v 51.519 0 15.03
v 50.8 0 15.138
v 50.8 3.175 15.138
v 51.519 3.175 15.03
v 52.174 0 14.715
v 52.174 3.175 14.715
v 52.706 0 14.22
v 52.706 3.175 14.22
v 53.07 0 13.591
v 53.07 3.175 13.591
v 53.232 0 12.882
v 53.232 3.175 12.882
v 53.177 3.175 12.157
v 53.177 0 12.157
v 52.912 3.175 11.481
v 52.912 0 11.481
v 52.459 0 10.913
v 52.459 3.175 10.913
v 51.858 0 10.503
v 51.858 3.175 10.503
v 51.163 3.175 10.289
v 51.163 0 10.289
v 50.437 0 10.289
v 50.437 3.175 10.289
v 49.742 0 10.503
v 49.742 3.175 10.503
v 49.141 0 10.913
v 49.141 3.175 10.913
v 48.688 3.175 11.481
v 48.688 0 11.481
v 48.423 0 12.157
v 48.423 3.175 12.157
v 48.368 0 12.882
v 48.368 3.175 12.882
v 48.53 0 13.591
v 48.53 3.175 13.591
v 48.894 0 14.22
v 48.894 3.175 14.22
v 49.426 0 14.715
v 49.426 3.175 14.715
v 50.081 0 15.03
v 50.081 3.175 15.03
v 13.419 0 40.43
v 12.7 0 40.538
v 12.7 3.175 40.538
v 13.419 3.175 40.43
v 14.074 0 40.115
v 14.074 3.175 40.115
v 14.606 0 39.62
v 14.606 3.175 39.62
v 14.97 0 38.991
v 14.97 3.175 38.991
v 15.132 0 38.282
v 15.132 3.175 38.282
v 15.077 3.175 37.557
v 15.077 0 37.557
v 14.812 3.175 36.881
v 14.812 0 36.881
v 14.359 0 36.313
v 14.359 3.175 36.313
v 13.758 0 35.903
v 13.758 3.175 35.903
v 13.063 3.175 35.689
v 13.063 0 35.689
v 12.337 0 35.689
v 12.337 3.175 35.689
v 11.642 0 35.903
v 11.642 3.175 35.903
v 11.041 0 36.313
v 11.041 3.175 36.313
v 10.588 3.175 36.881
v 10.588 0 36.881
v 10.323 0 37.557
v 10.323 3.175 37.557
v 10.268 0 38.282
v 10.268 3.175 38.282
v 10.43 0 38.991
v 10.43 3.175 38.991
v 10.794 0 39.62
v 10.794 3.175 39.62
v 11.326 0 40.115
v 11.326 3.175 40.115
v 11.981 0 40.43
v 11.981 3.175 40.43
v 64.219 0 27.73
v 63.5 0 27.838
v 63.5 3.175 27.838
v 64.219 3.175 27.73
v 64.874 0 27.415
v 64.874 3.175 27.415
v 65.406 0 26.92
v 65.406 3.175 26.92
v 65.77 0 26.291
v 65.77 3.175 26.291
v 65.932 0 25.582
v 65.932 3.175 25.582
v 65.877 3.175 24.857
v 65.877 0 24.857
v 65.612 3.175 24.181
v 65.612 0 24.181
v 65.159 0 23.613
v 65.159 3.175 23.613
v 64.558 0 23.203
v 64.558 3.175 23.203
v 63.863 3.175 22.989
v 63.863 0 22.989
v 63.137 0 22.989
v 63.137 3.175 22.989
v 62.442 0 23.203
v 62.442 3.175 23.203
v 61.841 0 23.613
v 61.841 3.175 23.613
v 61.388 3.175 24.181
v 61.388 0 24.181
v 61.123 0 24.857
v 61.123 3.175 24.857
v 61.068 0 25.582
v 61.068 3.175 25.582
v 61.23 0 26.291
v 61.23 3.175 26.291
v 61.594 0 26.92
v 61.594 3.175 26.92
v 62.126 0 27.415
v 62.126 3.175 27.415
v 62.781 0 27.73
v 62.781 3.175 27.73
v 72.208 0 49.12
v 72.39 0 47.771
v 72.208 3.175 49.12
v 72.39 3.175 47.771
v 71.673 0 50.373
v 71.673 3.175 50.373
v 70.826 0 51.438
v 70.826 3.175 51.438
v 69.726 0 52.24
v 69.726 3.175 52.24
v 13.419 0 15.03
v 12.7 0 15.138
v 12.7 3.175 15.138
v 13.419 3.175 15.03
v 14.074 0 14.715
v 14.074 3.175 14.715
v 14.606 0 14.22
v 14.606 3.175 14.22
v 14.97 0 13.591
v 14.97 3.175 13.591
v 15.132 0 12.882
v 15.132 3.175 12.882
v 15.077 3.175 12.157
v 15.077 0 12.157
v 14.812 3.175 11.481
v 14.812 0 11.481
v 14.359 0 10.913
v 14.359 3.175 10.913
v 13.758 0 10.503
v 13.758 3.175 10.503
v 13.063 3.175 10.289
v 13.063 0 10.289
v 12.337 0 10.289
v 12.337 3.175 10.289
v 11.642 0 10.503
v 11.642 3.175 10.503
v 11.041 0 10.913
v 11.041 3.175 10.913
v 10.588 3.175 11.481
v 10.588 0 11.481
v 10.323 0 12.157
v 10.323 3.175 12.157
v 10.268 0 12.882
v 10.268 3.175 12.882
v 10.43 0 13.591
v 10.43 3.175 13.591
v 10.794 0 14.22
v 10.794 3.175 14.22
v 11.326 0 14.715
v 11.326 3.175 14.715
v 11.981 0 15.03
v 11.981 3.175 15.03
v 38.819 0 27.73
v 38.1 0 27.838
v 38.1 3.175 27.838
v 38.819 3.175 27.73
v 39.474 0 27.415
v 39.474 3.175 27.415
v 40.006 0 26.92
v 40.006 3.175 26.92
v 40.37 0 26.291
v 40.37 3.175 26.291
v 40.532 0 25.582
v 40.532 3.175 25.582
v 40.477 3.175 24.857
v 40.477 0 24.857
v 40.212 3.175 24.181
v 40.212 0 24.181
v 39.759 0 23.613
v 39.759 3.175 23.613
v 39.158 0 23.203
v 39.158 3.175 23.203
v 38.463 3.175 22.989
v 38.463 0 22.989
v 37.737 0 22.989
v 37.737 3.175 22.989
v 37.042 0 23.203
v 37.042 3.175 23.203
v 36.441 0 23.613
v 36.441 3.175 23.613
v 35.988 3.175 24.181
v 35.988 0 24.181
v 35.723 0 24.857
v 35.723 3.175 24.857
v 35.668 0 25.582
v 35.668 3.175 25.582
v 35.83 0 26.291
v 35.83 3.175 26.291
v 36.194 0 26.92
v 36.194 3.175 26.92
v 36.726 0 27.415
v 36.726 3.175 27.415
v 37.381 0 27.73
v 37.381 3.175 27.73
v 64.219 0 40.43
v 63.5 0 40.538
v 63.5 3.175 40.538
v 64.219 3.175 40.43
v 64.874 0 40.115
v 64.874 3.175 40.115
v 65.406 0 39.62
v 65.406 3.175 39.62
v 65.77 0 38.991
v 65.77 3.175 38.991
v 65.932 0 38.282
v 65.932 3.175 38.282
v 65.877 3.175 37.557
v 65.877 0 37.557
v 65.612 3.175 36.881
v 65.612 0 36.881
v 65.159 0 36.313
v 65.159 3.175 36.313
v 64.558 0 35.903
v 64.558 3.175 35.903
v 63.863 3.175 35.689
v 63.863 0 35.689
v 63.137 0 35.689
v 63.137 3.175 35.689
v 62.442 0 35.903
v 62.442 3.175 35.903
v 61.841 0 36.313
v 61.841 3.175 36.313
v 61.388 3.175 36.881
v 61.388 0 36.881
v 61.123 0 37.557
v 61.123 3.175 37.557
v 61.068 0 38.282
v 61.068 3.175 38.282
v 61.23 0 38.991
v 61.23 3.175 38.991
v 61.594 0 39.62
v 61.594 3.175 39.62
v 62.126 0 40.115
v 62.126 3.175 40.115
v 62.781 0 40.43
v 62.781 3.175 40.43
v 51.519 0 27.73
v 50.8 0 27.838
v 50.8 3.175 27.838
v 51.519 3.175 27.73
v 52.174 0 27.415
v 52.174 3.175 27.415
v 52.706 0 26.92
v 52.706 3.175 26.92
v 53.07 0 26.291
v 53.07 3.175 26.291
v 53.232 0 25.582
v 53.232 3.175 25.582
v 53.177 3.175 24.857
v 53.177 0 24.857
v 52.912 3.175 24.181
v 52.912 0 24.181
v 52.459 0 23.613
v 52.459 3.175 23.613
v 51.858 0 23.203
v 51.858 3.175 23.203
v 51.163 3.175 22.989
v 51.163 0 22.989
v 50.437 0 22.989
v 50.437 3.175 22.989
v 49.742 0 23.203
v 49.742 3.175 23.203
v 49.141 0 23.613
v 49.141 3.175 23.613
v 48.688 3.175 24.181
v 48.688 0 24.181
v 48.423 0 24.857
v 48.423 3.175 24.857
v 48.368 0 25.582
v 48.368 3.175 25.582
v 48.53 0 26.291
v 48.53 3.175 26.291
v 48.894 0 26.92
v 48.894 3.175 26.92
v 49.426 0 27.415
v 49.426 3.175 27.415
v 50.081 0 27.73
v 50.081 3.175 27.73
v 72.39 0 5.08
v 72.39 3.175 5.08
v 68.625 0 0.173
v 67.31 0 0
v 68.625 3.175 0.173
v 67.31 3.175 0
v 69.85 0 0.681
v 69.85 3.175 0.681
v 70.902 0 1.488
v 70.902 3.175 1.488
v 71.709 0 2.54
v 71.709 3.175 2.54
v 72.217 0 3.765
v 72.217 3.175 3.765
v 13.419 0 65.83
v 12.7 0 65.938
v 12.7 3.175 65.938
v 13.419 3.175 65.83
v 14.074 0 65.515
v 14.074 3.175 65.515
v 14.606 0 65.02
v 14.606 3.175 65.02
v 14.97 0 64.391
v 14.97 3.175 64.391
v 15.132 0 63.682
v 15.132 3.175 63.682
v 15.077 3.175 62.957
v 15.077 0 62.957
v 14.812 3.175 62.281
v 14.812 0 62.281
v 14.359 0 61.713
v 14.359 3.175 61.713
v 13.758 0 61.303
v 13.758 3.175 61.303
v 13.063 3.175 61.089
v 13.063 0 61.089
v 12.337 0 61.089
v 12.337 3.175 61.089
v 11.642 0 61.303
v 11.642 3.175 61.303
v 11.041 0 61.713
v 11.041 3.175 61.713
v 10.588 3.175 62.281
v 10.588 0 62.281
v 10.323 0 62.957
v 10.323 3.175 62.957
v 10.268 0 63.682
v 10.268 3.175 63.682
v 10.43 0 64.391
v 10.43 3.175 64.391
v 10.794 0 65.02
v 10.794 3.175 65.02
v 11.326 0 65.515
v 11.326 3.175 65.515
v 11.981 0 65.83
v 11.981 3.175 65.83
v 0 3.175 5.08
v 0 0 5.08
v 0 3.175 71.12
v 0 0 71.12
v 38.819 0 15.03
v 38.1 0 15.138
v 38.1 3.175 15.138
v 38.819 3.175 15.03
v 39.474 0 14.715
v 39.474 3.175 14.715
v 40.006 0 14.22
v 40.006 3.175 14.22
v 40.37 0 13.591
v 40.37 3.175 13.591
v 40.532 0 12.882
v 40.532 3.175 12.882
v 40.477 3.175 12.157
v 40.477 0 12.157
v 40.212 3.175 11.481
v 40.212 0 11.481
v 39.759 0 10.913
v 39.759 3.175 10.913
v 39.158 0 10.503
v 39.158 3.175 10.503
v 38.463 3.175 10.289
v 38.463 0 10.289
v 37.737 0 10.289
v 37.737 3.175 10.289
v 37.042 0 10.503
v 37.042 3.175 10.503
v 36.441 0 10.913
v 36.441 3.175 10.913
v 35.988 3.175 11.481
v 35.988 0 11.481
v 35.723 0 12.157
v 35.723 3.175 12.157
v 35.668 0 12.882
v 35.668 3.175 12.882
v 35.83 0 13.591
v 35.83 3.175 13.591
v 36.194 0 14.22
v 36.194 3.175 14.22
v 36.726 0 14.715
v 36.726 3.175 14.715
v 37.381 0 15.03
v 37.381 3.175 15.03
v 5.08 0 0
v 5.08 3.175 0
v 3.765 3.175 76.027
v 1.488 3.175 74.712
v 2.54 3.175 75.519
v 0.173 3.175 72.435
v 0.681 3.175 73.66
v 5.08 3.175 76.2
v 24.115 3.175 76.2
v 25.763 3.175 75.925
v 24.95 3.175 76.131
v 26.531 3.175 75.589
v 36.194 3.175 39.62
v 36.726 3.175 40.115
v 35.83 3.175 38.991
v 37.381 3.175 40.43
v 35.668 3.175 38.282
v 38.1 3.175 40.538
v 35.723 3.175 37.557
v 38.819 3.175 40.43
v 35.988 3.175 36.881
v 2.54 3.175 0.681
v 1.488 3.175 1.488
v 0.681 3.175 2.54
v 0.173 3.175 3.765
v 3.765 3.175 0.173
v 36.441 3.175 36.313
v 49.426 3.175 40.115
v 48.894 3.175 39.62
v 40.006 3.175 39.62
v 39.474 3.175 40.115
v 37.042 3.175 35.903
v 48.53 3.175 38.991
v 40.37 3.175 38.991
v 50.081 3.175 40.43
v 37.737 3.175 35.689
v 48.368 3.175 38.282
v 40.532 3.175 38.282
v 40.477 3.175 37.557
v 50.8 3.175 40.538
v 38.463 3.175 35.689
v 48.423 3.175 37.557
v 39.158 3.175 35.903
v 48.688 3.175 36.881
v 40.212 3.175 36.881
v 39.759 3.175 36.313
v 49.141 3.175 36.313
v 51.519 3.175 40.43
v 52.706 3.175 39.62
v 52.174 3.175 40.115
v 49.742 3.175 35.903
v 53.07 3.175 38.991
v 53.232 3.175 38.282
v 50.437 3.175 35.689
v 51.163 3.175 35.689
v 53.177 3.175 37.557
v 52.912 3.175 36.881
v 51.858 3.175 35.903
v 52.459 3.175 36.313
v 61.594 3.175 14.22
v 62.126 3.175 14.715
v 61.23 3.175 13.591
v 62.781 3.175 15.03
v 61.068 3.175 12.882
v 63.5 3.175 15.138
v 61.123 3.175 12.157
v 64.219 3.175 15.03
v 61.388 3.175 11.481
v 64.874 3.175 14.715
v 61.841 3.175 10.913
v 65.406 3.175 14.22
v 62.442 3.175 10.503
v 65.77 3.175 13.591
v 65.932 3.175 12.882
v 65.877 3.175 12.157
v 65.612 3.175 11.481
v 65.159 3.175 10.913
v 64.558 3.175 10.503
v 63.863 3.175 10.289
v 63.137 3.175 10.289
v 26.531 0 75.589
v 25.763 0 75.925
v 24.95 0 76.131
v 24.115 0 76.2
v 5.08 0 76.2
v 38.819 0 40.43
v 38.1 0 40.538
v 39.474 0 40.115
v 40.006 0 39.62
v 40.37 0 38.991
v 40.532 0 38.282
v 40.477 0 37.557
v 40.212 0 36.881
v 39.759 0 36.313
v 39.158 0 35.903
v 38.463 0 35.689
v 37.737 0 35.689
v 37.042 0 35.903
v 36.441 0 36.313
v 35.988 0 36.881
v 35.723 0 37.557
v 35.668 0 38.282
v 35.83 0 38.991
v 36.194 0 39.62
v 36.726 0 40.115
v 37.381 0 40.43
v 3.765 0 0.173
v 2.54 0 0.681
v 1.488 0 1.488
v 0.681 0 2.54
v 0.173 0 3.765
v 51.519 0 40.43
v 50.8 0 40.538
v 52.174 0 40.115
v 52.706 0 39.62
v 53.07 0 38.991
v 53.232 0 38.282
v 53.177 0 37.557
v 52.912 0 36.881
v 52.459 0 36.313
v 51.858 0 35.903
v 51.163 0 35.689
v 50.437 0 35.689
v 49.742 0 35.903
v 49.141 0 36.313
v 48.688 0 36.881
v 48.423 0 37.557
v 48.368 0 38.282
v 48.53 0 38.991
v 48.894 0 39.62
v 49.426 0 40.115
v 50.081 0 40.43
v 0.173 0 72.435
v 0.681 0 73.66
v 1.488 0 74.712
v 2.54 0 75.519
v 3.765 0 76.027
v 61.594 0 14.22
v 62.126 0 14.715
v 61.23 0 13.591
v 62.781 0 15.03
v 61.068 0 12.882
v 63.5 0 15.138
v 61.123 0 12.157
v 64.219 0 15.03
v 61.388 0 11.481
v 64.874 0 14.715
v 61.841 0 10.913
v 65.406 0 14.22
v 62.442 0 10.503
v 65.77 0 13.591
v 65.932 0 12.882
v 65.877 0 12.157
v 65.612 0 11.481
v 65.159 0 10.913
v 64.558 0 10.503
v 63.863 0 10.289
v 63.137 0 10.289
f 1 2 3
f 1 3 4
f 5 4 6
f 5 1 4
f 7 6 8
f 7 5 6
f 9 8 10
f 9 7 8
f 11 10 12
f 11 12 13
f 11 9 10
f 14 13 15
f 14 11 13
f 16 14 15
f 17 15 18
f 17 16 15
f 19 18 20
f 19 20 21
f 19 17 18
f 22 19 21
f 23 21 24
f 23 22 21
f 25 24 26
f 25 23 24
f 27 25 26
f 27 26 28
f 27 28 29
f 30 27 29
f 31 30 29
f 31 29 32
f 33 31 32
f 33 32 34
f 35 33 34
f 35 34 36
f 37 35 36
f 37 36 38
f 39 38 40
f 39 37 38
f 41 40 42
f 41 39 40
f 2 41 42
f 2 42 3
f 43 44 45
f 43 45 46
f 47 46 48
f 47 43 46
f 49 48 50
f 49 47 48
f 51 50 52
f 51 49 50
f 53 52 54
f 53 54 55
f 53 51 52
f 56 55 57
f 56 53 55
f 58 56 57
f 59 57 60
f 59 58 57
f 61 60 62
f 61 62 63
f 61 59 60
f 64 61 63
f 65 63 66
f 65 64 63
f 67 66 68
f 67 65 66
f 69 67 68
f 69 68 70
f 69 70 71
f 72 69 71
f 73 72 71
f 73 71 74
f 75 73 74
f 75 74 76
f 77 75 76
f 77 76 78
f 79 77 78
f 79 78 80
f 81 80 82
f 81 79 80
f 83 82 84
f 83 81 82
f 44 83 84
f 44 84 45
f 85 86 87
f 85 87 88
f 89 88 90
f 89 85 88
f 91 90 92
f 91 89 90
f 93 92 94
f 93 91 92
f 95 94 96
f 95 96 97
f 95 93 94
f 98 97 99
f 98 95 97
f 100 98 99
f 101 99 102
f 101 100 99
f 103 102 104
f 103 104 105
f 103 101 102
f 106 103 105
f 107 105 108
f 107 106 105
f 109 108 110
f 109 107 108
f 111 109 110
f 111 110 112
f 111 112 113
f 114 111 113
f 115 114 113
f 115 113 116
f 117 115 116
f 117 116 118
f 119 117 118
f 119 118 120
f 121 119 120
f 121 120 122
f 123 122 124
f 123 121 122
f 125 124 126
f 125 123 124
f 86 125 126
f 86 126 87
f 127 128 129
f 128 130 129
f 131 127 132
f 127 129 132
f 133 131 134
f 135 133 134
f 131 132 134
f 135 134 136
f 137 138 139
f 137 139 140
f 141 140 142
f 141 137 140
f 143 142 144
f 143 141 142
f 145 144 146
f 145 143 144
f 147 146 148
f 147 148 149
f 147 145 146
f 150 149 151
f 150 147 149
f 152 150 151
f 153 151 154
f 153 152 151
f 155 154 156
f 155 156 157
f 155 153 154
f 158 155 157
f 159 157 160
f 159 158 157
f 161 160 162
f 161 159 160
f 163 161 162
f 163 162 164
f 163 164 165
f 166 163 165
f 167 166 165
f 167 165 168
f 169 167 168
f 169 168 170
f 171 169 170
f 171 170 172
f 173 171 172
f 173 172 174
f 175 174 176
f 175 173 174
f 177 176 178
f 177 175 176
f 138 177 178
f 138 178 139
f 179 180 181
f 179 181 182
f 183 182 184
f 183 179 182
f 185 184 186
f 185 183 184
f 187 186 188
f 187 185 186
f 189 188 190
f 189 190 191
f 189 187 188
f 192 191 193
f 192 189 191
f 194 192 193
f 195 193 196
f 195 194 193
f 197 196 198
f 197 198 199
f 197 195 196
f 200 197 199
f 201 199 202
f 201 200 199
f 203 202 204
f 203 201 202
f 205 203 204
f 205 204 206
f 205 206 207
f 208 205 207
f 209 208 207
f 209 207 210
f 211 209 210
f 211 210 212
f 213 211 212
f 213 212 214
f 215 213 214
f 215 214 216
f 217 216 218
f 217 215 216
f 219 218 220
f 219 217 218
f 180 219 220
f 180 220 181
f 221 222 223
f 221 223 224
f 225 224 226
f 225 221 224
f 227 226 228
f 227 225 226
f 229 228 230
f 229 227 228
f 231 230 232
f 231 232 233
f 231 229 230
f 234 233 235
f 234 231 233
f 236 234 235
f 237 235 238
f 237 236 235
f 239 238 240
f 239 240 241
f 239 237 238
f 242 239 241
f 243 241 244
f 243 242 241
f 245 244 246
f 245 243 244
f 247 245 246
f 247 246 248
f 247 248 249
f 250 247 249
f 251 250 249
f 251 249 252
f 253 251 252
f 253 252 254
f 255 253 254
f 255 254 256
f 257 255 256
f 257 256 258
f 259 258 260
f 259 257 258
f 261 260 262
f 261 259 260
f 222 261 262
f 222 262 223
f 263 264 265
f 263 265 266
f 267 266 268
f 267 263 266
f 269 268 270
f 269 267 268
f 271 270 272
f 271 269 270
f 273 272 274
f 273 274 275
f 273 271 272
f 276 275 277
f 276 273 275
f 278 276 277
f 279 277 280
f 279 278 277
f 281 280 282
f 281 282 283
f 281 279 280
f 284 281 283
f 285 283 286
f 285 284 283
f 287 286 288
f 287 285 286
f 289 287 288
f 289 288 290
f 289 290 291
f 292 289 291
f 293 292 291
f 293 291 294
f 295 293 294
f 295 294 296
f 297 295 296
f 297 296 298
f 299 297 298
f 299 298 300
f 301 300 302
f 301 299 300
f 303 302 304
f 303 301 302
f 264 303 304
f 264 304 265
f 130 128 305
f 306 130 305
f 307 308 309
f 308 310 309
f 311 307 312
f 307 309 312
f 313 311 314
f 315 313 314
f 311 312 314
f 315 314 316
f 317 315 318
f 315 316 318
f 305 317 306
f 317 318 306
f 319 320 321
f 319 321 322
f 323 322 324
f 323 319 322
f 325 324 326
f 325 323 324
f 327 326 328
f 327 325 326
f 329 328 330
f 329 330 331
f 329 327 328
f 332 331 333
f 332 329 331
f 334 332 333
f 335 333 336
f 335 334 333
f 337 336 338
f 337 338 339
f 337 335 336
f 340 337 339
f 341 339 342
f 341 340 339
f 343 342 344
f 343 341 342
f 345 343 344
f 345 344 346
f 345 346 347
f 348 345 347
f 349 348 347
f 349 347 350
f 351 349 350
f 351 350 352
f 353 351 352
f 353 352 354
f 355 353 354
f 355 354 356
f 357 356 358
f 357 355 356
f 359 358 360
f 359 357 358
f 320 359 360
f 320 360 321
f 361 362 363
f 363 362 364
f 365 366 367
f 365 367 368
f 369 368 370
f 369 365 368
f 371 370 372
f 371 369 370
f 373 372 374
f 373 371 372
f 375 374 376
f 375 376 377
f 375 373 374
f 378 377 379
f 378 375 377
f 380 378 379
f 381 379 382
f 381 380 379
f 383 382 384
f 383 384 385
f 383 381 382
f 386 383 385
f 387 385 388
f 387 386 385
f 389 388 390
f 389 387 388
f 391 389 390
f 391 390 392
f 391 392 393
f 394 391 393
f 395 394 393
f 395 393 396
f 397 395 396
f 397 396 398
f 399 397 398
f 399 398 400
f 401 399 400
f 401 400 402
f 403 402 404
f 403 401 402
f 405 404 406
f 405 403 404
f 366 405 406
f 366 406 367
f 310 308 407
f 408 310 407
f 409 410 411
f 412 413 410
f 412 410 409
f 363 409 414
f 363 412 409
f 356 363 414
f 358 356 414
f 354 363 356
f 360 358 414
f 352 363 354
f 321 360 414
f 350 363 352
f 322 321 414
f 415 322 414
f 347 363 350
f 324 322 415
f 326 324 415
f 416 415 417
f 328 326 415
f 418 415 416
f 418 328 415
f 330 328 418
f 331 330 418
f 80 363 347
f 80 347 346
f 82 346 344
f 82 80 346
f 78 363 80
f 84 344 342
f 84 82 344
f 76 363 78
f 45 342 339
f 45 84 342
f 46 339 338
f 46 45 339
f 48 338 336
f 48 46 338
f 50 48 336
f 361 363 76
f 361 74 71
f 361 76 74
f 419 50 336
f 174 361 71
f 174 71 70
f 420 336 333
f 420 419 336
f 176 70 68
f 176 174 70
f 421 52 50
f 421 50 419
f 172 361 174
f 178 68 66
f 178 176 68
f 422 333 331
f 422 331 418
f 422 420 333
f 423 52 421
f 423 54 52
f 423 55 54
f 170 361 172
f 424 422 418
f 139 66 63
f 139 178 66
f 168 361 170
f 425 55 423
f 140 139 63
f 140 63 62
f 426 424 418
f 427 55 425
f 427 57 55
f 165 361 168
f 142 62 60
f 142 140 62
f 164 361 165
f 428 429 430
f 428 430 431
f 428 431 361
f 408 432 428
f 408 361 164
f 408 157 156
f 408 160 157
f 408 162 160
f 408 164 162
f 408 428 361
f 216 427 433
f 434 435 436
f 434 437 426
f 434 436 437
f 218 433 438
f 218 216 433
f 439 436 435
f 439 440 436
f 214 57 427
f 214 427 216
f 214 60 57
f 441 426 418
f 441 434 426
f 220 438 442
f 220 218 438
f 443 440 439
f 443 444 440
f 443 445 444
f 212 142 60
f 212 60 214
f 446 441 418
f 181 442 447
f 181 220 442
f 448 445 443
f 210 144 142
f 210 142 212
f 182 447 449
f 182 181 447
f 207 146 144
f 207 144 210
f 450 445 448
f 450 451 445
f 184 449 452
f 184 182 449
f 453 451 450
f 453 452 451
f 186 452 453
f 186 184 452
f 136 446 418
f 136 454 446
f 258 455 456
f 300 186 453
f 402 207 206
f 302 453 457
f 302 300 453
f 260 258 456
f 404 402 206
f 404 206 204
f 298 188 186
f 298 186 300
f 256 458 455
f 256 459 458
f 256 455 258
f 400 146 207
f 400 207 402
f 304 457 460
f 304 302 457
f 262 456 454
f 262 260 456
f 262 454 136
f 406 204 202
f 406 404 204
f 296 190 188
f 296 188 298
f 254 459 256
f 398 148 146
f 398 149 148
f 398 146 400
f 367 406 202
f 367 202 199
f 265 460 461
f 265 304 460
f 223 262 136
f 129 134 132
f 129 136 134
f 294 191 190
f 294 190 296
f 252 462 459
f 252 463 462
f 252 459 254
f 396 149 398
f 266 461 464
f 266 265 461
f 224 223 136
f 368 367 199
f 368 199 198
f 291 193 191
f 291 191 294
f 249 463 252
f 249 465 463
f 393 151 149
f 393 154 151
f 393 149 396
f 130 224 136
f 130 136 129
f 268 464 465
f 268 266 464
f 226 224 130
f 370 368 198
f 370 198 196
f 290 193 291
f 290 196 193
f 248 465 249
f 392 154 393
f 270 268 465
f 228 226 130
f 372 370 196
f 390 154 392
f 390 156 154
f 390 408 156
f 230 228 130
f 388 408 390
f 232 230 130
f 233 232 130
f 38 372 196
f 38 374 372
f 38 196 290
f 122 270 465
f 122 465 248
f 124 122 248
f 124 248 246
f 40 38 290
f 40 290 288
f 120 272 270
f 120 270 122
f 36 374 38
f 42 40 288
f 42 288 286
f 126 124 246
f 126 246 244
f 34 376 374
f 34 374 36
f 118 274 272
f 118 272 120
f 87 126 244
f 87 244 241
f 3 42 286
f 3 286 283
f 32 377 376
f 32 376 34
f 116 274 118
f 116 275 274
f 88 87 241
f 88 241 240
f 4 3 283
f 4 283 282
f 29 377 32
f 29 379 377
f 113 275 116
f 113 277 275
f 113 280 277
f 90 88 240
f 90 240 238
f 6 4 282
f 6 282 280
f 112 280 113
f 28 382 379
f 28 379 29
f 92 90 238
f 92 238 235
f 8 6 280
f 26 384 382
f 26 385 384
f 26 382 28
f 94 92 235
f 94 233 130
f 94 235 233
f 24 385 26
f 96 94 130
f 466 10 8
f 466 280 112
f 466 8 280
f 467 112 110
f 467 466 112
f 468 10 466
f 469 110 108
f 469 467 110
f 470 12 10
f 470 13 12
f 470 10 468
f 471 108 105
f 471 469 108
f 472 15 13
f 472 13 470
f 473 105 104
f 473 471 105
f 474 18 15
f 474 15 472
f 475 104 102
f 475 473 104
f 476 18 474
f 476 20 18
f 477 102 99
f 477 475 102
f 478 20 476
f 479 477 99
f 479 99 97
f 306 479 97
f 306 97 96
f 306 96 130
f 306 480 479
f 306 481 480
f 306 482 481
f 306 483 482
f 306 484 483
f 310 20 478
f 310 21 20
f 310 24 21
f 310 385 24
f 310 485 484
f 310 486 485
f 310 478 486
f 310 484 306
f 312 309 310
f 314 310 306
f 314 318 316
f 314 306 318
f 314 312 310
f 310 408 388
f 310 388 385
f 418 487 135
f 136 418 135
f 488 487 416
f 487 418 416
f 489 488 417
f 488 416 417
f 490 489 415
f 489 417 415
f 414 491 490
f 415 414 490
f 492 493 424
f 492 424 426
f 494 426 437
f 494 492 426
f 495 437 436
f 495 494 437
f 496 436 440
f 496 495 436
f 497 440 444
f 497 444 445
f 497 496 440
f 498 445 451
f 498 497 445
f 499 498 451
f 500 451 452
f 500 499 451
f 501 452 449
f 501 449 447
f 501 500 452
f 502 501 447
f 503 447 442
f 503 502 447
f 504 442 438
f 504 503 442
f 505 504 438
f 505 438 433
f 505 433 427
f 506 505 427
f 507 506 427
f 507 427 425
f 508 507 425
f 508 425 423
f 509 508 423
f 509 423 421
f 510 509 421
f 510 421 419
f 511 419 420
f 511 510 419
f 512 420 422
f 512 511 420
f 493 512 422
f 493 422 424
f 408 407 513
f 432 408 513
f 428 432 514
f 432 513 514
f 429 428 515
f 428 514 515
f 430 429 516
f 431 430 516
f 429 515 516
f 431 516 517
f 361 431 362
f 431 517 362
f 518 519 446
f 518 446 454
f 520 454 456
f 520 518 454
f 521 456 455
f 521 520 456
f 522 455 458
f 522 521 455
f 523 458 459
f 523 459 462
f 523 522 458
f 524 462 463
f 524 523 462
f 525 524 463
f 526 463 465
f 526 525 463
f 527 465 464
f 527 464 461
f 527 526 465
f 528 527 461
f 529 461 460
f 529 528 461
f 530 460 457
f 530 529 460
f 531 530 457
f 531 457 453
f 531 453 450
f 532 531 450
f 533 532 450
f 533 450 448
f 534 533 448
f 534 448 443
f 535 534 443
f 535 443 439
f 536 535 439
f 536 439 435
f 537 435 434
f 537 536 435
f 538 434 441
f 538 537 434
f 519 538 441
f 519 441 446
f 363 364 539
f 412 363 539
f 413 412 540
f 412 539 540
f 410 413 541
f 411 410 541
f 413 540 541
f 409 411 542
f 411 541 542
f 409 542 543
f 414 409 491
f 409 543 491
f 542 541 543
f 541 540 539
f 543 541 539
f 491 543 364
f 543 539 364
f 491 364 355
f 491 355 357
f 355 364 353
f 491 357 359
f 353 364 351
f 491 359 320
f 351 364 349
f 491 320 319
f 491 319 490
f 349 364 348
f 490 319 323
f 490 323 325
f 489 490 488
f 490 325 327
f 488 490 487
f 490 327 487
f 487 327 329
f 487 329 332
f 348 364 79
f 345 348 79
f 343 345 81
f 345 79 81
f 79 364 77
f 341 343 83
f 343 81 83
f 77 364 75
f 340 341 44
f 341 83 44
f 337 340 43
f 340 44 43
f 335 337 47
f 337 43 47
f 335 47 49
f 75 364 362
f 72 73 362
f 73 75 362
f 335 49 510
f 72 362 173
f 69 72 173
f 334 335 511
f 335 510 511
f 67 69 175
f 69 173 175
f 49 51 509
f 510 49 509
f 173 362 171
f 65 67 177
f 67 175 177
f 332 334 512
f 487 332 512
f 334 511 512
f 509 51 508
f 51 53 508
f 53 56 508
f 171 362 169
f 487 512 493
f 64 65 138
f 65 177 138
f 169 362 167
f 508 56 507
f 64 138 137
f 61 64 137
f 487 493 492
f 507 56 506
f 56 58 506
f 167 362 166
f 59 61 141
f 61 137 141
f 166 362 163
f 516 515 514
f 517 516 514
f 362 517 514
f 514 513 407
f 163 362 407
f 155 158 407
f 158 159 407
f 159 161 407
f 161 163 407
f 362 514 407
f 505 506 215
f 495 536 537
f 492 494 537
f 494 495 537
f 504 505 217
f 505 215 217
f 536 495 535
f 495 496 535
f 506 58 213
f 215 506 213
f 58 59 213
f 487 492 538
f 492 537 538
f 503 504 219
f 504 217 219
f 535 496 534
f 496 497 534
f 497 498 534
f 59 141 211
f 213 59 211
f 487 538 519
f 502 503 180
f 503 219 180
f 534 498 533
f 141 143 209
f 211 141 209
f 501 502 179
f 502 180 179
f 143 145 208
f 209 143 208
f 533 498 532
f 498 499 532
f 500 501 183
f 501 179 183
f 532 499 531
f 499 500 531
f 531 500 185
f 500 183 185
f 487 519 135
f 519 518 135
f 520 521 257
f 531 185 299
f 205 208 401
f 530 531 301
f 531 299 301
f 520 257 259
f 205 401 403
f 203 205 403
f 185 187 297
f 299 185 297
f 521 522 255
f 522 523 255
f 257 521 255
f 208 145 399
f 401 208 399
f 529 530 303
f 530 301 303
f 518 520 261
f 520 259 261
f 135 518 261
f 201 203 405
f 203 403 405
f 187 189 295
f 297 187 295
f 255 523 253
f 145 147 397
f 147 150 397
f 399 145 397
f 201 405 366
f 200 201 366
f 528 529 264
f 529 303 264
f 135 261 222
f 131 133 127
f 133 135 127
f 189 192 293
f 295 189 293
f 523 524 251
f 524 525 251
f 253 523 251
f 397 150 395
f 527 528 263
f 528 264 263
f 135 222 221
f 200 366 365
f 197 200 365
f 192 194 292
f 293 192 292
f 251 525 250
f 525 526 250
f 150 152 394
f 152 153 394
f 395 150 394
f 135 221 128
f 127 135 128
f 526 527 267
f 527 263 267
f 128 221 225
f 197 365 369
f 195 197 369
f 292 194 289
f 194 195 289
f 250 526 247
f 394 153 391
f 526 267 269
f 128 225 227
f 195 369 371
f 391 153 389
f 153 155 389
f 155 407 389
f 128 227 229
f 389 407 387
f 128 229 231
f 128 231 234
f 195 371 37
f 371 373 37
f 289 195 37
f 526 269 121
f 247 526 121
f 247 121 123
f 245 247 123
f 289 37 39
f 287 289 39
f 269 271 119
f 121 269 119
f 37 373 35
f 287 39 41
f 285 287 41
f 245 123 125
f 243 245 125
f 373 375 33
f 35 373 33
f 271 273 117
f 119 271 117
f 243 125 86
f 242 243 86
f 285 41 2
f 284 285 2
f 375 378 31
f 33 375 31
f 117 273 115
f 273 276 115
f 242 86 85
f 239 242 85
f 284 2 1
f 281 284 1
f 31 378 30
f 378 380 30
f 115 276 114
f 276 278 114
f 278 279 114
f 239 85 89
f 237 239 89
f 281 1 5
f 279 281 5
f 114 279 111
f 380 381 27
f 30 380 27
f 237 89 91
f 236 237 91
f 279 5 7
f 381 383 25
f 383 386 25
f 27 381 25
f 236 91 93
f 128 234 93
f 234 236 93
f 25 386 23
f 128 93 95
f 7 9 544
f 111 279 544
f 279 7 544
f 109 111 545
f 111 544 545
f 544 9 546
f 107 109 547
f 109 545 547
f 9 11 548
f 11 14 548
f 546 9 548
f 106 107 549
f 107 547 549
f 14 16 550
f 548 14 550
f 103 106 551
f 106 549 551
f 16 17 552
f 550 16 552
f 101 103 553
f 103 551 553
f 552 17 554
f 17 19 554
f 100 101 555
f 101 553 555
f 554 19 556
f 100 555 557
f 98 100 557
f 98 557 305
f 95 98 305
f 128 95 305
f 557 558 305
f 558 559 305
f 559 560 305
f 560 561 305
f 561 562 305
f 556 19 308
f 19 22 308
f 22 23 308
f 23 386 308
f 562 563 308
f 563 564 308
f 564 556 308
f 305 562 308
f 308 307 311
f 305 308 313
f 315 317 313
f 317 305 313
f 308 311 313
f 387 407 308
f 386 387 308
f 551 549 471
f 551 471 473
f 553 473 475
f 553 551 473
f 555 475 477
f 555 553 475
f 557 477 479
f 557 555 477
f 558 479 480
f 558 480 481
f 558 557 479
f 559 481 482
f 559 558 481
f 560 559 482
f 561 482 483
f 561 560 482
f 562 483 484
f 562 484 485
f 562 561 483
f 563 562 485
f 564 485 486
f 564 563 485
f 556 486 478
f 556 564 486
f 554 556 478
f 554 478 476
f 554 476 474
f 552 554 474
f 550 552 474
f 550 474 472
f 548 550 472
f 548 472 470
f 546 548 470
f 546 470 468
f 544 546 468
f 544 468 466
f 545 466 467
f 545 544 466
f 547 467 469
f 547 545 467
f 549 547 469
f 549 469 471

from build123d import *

# Parameters (mm, degrees)
SKETCH1_R           = 2.4384
BOSS_EXTRUDE1_DEPTH = 3.175
FILLET3_R           = 5.08


with BuildPart() as part:
    # Sketch1 → Boss-Extrude1 (new body)
    with BuildSketch(Plane(origin=(0, 0, 0), x_dir=(1, 0, 0), z_dir=(0, 1, 0))):
        with BuildLine():
            ThreePointArc((5.08, 0), (1.487897552, -1.487897552), (0, -5.08))
            Line((0, -5.08), (0, -71.12))
            ThreePointArc((0, -71.12), (1.487897552, -74.712102448), (5.08, -76.2))
            Line((5.08, -76.2), (25.4, -76.2))
            Line((25.4, -76.2), (72.39, -50.8))
            Line((72.39, -50.8), (72.39, 0))
            Line((72.39, 0), (5.08, 0))
        make_face()
        with Locations(Location((50.8, -38.1, 0), (0, 0, 270))):
            Circle(SKETCH1_R, mode=Mode.SUBTRACT)
        with Locations(Location((50.8, -25.4, 0), (0, 0, 270))):
            Circle(SKETCH1_R, mode=Mode.SUBTRACT)
        with Locations(Location((50.8, -12.7, 0), (0, 0, 270))):
            Circle(SKETCH1_R, mode=Mode.SUBTRACT)
        with Locations(Location((12.7, -63.5, 0), (0, 0, 270))):
            Circle(SKETCH1_R, mode=Mode.SUBTRACT)
        with Locations(Location((63.5, -38.1, 0), (0, 0, 270))):
            Circle(SKETCH1_R, mode=Mode.SUBTRACT)
        with Locations(Location((63.5, -25.4, 0), (0, 0, 270))):
            Circle(SKETCH1_R, mode=Mode.SUBTRACT)
        with Locations(Location((63.5, -12.7, 0), (0, 0, 270))):
            Circle(SKETCH1_R, mode=Mode.SUBTRACT)
        with Locations(Location((12.7, -38.1, 0), (0, 0, 270))):
            Circle(SKETCH1_R, mode=Mode.SUBTRACT)
        with Locations(Location((12.7, -12.7, 0), (0, 0, 270))):
            Circle(SKETCH1_R, mode=Mode.SUBTRACT)
        with Locations(Location((38.1, -38.1, 0), (0, 0, 270))):
            Circle(SKETCH1_R, mode=Mode.SUBTRACT)
        with Locations(Location((38.1, -25.4, 0), (0, 0, 270))):
            Circle(SKETCH1_R, mode=Mode.SUBTRACT)
        with Locations(Location((38.1, -12.7, 0), (0, 0, 270))):
            Circle(SKETCH1_R, mode=Mode.SUBTRACT)
    extrude(amount=BOSS_EXTRUDE1_DEPTH)

    # Fillet3
    fillet3_edges = [part.edges().sort_by_distance(p)[0] for p in [
        (72.39, 1.5875, 0),
        (72.39, 1.5875, 50.8),
        (25.4, 1.5875, 76.2),
    ]]
    fillet(fillet3_edges, radius=FILLET3_R)


solid = part.part
